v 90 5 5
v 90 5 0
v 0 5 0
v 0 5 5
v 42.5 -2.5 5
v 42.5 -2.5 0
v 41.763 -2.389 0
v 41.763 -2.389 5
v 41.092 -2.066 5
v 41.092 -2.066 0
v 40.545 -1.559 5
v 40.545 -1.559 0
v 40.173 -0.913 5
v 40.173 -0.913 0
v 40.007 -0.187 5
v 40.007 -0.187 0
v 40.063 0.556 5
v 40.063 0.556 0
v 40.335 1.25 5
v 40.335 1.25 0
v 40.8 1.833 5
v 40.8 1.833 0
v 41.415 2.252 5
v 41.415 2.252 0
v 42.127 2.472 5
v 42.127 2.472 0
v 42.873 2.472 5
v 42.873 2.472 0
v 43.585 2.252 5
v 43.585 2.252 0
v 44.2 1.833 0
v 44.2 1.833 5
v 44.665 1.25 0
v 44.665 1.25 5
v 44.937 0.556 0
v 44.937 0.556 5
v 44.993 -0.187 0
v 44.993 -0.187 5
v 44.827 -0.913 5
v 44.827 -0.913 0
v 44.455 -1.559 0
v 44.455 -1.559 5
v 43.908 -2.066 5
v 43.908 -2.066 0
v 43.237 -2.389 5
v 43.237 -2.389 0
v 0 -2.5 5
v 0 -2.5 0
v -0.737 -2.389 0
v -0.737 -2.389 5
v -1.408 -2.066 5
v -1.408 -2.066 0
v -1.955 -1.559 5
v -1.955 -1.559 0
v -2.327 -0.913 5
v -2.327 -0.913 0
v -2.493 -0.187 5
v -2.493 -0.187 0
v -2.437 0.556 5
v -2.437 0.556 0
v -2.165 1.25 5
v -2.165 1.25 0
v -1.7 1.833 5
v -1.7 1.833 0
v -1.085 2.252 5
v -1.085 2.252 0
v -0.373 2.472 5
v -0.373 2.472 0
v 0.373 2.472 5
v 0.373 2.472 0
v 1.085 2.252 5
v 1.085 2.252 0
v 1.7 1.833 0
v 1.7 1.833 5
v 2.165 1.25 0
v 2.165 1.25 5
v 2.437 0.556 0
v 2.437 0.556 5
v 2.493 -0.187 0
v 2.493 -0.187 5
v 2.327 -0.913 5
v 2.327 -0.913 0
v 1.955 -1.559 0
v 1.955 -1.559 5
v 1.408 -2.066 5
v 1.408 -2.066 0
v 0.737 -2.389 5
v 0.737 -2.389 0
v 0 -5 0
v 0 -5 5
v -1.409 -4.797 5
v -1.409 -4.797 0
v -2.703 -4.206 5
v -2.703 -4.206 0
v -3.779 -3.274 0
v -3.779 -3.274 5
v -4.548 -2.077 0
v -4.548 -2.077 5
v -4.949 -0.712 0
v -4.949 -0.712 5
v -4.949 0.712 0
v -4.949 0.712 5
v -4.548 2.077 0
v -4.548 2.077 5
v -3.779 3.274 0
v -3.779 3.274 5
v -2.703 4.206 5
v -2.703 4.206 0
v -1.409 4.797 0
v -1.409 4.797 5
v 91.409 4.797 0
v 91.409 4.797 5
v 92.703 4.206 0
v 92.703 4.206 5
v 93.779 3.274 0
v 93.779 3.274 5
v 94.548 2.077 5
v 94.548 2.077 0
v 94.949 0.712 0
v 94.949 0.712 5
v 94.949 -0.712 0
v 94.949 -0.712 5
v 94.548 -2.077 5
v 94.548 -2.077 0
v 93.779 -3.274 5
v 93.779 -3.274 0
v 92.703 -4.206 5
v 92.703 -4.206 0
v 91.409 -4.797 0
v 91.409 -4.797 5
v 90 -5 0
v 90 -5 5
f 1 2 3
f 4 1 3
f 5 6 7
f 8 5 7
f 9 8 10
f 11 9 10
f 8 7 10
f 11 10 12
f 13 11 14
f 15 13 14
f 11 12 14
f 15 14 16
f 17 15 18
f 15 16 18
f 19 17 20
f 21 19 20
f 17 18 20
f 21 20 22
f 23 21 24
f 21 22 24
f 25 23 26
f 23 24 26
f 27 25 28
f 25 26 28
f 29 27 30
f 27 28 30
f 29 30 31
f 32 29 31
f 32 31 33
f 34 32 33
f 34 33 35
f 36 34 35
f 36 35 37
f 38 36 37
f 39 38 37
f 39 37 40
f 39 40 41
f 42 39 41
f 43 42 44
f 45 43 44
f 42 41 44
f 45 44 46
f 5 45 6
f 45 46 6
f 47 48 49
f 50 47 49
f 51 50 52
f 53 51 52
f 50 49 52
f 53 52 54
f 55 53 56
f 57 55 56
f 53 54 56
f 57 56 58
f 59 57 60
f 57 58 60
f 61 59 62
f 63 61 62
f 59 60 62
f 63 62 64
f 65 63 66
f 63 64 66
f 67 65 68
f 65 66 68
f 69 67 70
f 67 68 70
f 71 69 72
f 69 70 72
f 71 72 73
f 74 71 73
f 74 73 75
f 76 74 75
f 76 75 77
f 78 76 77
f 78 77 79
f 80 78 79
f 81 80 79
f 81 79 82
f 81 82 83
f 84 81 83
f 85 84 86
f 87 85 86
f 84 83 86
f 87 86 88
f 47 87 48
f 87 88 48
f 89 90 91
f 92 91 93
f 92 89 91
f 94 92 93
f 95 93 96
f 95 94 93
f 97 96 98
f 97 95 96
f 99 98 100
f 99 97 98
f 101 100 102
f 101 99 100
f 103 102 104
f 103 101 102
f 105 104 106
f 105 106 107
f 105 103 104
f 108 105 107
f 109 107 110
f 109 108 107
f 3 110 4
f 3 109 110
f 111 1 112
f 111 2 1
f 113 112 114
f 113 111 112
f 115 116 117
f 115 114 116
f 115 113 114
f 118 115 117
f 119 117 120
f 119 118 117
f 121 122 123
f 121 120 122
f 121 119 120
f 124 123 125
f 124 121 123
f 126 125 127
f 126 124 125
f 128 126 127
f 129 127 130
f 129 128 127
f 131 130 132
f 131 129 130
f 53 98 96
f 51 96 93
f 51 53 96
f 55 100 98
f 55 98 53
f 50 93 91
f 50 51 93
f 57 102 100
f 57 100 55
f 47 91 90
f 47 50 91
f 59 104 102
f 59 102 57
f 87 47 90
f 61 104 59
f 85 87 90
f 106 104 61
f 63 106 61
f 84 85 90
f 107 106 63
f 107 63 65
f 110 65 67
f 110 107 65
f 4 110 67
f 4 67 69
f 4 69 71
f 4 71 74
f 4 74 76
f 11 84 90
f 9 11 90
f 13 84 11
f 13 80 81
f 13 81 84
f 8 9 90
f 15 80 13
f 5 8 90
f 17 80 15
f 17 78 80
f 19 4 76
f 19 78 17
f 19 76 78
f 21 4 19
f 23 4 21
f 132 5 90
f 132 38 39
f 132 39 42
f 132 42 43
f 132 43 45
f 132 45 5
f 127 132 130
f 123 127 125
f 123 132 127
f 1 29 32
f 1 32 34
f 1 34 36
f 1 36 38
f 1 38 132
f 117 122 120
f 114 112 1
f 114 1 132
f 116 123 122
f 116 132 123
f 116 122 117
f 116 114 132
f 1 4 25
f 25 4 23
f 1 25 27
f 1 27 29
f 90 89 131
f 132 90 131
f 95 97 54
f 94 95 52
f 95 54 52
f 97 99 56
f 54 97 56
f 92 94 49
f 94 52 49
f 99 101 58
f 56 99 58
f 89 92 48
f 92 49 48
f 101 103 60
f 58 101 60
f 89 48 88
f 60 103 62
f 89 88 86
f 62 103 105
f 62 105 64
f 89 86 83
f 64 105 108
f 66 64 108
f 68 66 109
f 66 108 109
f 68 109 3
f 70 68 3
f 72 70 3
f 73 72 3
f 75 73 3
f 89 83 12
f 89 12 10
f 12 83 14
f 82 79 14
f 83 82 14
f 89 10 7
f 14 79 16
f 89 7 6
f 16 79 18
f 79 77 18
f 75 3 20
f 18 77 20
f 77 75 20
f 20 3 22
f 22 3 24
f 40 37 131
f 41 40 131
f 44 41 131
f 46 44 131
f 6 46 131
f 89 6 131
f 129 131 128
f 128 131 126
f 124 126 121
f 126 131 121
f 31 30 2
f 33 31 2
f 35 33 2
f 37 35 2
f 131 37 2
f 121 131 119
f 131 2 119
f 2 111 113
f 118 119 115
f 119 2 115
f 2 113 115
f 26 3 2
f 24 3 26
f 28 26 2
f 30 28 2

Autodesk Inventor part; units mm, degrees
ref_plane "YZ Plane" through (0, 0, 0) normal (1, 0, 0) x (0, 1, 0)
ref_plane "XZ Plane" through (0, 0, 0) normal (0, 1, 0) x (-1, 0, 0)
ref_plane "XY Plane" through (0, 0, 0) normal (0, 0, 1) x (1, 0, 0)
sketch "Skizze1" plane through (0, 0, 0) normal (0, 0, 1) x (1, 0, 0)
  line L0 (-25, 0) -> (115, 0) projected
  line L1 (0, -7) -> (0, 7) projected
  line L2 (0, 0) -> (90, 0) construction
  line L3 (0, -5) -> (90, -5)
  line L4 (90, 5) -> (0, 5)
  arc A0 (0, 5) -> (0, -5) centre (0, 0) ccw
  arc A1 (90, -5) -> (90, 5) centre (90, 0) ccw
  point P0 (45, 0)
  dimension "d0" = 90
  dimension "d1" = 10
extrude "Extrusion1" add sketch "Skizze1" along normal blind 5
sketch "Skizze2" plane through (0, 0, 5) normal (0, 0, 1) x (1, 0, 0)
  point P0 (0, 0)
  point P1 (0, 0)
hole "Bohrung1" at (0, 0, 5) direction (0, 0, -1) diameter 5 end through all
sketch "Skizze3" plane through (0, 0, 5) normal (0, 0, 1) x (1, 0, 0)
  point P0 (0, 0)
  point P1 (42.5, 0)
  dimension "d11" = 42.5
hole "Bohrung2" at (42.5, 0, 5) direction (0, 0, -1) diameter 5 end through all
properties part number "Hebel"
